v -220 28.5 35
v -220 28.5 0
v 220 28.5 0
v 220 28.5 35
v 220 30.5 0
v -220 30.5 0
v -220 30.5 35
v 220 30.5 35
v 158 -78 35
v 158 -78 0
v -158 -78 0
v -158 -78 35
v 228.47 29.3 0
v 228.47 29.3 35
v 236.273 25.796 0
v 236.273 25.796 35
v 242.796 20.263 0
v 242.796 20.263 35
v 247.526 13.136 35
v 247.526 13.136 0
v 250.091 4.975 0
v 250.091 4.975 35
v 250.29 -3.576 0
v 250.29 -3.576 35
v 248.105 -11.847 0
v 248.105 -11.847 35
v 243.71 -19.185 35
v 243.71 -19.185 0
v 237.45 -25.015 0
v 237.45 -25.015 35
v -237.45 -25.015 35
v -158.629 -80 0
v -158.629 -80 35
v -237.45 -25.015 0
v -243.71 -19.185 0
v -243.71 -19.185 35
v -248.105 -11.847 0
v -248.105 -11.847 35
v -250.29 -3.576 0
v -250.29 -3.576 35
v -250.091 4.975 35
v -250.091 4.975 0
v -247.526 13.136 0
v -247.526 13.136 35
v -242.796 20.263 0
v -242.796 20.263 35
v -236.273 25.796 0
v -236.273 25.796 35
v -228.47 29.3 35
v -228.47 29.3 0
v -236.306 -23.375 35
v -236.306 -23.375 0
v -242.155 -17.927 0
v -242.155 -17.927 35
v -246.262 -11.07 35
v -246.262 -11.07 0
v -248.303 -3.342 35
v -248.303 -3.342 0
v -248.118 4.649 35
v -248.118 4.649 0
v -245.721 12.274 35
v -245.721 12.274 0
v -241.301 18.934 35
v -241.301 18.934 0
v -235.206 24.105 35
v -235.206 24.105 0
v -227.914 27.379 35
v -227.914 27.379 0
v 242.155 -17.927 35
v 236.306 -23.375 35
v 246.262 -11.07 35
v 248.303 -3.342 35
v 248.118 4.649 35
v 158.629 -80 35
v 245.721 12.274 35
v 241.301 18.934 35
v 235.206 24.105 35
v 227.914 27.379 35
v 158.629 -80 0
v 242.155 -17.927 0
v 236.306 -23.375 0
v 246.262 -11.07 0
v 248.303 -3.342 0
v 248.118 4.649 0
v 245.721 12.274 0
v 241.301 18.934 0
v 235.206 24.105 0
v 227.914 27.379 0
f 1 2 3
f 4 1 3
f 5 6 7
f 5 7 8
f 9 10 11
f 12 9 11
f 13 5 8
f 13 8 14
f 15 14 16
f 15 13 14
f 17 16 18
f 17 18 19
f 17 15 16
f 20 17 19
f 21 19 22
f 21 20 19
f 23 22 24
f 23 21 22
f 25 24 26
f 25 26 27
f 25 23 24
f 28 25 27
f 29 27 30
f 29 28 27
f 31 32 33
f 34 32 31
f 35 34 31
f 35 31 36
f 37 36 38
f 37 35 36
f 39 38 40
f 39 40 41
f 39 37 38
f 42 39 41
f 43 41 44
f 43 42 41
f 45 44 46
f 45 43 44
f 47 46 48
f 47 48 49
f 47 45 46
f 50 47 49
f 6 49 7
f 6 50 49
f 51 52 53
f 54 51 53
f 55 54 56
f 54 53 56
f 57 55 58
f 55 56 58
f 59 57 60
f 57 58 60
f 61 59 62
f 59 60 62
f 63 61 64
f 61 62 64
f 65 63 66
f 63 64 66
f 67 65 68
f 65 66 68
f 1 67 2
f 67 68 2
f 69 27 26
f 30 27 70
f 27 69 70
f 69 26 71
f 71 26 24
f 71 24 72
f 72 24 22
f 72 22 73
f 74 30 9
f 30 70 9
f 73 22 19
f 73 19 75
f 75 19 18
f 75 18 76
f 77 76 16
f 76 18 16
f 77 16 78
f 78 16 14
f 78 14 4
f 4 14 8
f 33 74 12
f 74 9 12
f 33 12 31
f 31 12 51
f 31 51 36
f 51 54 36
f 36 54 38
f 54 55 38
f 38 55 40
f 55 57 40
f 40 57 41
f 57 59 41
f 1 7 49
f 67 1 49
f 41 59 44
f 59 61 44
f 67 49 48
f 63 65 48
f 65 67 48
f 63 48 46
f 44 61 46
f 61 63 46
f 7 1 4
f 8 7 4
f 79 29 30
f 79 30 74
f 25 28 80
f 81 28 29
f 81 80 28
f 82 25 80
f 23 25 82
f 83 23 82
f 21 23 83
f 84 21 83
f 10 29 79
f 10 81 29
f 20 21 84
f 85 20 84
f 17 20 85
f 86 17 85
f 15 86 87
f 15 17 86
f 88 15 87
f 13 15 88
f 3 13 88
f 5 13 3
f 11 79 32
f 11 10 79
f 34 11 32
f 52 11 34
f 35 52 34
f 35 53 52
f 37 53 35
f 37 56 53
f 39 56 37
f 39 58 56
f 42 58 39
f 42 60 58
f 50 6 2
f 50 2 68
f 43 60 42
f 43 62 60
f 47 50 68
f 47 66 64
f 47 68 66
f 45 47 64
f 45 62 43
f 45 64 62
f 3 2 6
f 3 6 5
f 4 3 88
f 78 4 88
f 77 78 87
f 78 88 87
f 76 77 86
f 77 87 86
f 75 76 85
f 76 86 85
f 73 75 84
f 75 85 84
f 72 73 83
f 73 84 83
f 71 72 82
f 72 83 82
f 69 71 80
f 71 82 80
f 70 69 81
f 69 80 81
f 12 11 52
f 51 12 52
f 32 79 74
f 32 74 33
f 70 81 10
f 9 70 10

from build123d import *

# Parameters (mm, degrees)
EXTRUDE_1_DEPTH = 35


with BuildPart() as part:
    # 草图1 → 拉伸-薄壁1 (new body)
    with BuildSketch(Plane.XY):
        with BuildLine():
            Line((237.450135309, -25.014851143), (158.628665481, -80))
            Line((158.628665481, -80), (-158.628665481, -80))
            Line((-158.628665481, -80), (-237.450135309, -25.014851143))
            ThreePointArc((-237.450135309, -25.014851143), (-249.09641696, 9.145956487), (-220, 30.5))
            Line((-220, 30.5), (220, 30.5))
            ThreePointArc((220, 30.5), (249.09641696, 9.145956487), (237.450135309, -25.014851143))
        make_face()
        with BuildLine():
            Line((236.305864141, -23.374533035), (158, -78))
            Line((158, -78), (-158, -78))
            Line((-158, -78), (-236.305864141, -23.374533035))
            ThreePointArc((-236.305864141, -23.374533035), (-247.188455192, 8.546221636), (-220, 28.5))
            Line((-220, 28.5), (220, 28.5))
            ThreePointArc((220, 28.5), (247.188455192, 8.546221636), (236.305864141, -23.374533035))
        make_face(mode=Mode.SUBTRACT)
    extrude(amount=EXTRUDE_1_DEPTH)


solid = part.part
